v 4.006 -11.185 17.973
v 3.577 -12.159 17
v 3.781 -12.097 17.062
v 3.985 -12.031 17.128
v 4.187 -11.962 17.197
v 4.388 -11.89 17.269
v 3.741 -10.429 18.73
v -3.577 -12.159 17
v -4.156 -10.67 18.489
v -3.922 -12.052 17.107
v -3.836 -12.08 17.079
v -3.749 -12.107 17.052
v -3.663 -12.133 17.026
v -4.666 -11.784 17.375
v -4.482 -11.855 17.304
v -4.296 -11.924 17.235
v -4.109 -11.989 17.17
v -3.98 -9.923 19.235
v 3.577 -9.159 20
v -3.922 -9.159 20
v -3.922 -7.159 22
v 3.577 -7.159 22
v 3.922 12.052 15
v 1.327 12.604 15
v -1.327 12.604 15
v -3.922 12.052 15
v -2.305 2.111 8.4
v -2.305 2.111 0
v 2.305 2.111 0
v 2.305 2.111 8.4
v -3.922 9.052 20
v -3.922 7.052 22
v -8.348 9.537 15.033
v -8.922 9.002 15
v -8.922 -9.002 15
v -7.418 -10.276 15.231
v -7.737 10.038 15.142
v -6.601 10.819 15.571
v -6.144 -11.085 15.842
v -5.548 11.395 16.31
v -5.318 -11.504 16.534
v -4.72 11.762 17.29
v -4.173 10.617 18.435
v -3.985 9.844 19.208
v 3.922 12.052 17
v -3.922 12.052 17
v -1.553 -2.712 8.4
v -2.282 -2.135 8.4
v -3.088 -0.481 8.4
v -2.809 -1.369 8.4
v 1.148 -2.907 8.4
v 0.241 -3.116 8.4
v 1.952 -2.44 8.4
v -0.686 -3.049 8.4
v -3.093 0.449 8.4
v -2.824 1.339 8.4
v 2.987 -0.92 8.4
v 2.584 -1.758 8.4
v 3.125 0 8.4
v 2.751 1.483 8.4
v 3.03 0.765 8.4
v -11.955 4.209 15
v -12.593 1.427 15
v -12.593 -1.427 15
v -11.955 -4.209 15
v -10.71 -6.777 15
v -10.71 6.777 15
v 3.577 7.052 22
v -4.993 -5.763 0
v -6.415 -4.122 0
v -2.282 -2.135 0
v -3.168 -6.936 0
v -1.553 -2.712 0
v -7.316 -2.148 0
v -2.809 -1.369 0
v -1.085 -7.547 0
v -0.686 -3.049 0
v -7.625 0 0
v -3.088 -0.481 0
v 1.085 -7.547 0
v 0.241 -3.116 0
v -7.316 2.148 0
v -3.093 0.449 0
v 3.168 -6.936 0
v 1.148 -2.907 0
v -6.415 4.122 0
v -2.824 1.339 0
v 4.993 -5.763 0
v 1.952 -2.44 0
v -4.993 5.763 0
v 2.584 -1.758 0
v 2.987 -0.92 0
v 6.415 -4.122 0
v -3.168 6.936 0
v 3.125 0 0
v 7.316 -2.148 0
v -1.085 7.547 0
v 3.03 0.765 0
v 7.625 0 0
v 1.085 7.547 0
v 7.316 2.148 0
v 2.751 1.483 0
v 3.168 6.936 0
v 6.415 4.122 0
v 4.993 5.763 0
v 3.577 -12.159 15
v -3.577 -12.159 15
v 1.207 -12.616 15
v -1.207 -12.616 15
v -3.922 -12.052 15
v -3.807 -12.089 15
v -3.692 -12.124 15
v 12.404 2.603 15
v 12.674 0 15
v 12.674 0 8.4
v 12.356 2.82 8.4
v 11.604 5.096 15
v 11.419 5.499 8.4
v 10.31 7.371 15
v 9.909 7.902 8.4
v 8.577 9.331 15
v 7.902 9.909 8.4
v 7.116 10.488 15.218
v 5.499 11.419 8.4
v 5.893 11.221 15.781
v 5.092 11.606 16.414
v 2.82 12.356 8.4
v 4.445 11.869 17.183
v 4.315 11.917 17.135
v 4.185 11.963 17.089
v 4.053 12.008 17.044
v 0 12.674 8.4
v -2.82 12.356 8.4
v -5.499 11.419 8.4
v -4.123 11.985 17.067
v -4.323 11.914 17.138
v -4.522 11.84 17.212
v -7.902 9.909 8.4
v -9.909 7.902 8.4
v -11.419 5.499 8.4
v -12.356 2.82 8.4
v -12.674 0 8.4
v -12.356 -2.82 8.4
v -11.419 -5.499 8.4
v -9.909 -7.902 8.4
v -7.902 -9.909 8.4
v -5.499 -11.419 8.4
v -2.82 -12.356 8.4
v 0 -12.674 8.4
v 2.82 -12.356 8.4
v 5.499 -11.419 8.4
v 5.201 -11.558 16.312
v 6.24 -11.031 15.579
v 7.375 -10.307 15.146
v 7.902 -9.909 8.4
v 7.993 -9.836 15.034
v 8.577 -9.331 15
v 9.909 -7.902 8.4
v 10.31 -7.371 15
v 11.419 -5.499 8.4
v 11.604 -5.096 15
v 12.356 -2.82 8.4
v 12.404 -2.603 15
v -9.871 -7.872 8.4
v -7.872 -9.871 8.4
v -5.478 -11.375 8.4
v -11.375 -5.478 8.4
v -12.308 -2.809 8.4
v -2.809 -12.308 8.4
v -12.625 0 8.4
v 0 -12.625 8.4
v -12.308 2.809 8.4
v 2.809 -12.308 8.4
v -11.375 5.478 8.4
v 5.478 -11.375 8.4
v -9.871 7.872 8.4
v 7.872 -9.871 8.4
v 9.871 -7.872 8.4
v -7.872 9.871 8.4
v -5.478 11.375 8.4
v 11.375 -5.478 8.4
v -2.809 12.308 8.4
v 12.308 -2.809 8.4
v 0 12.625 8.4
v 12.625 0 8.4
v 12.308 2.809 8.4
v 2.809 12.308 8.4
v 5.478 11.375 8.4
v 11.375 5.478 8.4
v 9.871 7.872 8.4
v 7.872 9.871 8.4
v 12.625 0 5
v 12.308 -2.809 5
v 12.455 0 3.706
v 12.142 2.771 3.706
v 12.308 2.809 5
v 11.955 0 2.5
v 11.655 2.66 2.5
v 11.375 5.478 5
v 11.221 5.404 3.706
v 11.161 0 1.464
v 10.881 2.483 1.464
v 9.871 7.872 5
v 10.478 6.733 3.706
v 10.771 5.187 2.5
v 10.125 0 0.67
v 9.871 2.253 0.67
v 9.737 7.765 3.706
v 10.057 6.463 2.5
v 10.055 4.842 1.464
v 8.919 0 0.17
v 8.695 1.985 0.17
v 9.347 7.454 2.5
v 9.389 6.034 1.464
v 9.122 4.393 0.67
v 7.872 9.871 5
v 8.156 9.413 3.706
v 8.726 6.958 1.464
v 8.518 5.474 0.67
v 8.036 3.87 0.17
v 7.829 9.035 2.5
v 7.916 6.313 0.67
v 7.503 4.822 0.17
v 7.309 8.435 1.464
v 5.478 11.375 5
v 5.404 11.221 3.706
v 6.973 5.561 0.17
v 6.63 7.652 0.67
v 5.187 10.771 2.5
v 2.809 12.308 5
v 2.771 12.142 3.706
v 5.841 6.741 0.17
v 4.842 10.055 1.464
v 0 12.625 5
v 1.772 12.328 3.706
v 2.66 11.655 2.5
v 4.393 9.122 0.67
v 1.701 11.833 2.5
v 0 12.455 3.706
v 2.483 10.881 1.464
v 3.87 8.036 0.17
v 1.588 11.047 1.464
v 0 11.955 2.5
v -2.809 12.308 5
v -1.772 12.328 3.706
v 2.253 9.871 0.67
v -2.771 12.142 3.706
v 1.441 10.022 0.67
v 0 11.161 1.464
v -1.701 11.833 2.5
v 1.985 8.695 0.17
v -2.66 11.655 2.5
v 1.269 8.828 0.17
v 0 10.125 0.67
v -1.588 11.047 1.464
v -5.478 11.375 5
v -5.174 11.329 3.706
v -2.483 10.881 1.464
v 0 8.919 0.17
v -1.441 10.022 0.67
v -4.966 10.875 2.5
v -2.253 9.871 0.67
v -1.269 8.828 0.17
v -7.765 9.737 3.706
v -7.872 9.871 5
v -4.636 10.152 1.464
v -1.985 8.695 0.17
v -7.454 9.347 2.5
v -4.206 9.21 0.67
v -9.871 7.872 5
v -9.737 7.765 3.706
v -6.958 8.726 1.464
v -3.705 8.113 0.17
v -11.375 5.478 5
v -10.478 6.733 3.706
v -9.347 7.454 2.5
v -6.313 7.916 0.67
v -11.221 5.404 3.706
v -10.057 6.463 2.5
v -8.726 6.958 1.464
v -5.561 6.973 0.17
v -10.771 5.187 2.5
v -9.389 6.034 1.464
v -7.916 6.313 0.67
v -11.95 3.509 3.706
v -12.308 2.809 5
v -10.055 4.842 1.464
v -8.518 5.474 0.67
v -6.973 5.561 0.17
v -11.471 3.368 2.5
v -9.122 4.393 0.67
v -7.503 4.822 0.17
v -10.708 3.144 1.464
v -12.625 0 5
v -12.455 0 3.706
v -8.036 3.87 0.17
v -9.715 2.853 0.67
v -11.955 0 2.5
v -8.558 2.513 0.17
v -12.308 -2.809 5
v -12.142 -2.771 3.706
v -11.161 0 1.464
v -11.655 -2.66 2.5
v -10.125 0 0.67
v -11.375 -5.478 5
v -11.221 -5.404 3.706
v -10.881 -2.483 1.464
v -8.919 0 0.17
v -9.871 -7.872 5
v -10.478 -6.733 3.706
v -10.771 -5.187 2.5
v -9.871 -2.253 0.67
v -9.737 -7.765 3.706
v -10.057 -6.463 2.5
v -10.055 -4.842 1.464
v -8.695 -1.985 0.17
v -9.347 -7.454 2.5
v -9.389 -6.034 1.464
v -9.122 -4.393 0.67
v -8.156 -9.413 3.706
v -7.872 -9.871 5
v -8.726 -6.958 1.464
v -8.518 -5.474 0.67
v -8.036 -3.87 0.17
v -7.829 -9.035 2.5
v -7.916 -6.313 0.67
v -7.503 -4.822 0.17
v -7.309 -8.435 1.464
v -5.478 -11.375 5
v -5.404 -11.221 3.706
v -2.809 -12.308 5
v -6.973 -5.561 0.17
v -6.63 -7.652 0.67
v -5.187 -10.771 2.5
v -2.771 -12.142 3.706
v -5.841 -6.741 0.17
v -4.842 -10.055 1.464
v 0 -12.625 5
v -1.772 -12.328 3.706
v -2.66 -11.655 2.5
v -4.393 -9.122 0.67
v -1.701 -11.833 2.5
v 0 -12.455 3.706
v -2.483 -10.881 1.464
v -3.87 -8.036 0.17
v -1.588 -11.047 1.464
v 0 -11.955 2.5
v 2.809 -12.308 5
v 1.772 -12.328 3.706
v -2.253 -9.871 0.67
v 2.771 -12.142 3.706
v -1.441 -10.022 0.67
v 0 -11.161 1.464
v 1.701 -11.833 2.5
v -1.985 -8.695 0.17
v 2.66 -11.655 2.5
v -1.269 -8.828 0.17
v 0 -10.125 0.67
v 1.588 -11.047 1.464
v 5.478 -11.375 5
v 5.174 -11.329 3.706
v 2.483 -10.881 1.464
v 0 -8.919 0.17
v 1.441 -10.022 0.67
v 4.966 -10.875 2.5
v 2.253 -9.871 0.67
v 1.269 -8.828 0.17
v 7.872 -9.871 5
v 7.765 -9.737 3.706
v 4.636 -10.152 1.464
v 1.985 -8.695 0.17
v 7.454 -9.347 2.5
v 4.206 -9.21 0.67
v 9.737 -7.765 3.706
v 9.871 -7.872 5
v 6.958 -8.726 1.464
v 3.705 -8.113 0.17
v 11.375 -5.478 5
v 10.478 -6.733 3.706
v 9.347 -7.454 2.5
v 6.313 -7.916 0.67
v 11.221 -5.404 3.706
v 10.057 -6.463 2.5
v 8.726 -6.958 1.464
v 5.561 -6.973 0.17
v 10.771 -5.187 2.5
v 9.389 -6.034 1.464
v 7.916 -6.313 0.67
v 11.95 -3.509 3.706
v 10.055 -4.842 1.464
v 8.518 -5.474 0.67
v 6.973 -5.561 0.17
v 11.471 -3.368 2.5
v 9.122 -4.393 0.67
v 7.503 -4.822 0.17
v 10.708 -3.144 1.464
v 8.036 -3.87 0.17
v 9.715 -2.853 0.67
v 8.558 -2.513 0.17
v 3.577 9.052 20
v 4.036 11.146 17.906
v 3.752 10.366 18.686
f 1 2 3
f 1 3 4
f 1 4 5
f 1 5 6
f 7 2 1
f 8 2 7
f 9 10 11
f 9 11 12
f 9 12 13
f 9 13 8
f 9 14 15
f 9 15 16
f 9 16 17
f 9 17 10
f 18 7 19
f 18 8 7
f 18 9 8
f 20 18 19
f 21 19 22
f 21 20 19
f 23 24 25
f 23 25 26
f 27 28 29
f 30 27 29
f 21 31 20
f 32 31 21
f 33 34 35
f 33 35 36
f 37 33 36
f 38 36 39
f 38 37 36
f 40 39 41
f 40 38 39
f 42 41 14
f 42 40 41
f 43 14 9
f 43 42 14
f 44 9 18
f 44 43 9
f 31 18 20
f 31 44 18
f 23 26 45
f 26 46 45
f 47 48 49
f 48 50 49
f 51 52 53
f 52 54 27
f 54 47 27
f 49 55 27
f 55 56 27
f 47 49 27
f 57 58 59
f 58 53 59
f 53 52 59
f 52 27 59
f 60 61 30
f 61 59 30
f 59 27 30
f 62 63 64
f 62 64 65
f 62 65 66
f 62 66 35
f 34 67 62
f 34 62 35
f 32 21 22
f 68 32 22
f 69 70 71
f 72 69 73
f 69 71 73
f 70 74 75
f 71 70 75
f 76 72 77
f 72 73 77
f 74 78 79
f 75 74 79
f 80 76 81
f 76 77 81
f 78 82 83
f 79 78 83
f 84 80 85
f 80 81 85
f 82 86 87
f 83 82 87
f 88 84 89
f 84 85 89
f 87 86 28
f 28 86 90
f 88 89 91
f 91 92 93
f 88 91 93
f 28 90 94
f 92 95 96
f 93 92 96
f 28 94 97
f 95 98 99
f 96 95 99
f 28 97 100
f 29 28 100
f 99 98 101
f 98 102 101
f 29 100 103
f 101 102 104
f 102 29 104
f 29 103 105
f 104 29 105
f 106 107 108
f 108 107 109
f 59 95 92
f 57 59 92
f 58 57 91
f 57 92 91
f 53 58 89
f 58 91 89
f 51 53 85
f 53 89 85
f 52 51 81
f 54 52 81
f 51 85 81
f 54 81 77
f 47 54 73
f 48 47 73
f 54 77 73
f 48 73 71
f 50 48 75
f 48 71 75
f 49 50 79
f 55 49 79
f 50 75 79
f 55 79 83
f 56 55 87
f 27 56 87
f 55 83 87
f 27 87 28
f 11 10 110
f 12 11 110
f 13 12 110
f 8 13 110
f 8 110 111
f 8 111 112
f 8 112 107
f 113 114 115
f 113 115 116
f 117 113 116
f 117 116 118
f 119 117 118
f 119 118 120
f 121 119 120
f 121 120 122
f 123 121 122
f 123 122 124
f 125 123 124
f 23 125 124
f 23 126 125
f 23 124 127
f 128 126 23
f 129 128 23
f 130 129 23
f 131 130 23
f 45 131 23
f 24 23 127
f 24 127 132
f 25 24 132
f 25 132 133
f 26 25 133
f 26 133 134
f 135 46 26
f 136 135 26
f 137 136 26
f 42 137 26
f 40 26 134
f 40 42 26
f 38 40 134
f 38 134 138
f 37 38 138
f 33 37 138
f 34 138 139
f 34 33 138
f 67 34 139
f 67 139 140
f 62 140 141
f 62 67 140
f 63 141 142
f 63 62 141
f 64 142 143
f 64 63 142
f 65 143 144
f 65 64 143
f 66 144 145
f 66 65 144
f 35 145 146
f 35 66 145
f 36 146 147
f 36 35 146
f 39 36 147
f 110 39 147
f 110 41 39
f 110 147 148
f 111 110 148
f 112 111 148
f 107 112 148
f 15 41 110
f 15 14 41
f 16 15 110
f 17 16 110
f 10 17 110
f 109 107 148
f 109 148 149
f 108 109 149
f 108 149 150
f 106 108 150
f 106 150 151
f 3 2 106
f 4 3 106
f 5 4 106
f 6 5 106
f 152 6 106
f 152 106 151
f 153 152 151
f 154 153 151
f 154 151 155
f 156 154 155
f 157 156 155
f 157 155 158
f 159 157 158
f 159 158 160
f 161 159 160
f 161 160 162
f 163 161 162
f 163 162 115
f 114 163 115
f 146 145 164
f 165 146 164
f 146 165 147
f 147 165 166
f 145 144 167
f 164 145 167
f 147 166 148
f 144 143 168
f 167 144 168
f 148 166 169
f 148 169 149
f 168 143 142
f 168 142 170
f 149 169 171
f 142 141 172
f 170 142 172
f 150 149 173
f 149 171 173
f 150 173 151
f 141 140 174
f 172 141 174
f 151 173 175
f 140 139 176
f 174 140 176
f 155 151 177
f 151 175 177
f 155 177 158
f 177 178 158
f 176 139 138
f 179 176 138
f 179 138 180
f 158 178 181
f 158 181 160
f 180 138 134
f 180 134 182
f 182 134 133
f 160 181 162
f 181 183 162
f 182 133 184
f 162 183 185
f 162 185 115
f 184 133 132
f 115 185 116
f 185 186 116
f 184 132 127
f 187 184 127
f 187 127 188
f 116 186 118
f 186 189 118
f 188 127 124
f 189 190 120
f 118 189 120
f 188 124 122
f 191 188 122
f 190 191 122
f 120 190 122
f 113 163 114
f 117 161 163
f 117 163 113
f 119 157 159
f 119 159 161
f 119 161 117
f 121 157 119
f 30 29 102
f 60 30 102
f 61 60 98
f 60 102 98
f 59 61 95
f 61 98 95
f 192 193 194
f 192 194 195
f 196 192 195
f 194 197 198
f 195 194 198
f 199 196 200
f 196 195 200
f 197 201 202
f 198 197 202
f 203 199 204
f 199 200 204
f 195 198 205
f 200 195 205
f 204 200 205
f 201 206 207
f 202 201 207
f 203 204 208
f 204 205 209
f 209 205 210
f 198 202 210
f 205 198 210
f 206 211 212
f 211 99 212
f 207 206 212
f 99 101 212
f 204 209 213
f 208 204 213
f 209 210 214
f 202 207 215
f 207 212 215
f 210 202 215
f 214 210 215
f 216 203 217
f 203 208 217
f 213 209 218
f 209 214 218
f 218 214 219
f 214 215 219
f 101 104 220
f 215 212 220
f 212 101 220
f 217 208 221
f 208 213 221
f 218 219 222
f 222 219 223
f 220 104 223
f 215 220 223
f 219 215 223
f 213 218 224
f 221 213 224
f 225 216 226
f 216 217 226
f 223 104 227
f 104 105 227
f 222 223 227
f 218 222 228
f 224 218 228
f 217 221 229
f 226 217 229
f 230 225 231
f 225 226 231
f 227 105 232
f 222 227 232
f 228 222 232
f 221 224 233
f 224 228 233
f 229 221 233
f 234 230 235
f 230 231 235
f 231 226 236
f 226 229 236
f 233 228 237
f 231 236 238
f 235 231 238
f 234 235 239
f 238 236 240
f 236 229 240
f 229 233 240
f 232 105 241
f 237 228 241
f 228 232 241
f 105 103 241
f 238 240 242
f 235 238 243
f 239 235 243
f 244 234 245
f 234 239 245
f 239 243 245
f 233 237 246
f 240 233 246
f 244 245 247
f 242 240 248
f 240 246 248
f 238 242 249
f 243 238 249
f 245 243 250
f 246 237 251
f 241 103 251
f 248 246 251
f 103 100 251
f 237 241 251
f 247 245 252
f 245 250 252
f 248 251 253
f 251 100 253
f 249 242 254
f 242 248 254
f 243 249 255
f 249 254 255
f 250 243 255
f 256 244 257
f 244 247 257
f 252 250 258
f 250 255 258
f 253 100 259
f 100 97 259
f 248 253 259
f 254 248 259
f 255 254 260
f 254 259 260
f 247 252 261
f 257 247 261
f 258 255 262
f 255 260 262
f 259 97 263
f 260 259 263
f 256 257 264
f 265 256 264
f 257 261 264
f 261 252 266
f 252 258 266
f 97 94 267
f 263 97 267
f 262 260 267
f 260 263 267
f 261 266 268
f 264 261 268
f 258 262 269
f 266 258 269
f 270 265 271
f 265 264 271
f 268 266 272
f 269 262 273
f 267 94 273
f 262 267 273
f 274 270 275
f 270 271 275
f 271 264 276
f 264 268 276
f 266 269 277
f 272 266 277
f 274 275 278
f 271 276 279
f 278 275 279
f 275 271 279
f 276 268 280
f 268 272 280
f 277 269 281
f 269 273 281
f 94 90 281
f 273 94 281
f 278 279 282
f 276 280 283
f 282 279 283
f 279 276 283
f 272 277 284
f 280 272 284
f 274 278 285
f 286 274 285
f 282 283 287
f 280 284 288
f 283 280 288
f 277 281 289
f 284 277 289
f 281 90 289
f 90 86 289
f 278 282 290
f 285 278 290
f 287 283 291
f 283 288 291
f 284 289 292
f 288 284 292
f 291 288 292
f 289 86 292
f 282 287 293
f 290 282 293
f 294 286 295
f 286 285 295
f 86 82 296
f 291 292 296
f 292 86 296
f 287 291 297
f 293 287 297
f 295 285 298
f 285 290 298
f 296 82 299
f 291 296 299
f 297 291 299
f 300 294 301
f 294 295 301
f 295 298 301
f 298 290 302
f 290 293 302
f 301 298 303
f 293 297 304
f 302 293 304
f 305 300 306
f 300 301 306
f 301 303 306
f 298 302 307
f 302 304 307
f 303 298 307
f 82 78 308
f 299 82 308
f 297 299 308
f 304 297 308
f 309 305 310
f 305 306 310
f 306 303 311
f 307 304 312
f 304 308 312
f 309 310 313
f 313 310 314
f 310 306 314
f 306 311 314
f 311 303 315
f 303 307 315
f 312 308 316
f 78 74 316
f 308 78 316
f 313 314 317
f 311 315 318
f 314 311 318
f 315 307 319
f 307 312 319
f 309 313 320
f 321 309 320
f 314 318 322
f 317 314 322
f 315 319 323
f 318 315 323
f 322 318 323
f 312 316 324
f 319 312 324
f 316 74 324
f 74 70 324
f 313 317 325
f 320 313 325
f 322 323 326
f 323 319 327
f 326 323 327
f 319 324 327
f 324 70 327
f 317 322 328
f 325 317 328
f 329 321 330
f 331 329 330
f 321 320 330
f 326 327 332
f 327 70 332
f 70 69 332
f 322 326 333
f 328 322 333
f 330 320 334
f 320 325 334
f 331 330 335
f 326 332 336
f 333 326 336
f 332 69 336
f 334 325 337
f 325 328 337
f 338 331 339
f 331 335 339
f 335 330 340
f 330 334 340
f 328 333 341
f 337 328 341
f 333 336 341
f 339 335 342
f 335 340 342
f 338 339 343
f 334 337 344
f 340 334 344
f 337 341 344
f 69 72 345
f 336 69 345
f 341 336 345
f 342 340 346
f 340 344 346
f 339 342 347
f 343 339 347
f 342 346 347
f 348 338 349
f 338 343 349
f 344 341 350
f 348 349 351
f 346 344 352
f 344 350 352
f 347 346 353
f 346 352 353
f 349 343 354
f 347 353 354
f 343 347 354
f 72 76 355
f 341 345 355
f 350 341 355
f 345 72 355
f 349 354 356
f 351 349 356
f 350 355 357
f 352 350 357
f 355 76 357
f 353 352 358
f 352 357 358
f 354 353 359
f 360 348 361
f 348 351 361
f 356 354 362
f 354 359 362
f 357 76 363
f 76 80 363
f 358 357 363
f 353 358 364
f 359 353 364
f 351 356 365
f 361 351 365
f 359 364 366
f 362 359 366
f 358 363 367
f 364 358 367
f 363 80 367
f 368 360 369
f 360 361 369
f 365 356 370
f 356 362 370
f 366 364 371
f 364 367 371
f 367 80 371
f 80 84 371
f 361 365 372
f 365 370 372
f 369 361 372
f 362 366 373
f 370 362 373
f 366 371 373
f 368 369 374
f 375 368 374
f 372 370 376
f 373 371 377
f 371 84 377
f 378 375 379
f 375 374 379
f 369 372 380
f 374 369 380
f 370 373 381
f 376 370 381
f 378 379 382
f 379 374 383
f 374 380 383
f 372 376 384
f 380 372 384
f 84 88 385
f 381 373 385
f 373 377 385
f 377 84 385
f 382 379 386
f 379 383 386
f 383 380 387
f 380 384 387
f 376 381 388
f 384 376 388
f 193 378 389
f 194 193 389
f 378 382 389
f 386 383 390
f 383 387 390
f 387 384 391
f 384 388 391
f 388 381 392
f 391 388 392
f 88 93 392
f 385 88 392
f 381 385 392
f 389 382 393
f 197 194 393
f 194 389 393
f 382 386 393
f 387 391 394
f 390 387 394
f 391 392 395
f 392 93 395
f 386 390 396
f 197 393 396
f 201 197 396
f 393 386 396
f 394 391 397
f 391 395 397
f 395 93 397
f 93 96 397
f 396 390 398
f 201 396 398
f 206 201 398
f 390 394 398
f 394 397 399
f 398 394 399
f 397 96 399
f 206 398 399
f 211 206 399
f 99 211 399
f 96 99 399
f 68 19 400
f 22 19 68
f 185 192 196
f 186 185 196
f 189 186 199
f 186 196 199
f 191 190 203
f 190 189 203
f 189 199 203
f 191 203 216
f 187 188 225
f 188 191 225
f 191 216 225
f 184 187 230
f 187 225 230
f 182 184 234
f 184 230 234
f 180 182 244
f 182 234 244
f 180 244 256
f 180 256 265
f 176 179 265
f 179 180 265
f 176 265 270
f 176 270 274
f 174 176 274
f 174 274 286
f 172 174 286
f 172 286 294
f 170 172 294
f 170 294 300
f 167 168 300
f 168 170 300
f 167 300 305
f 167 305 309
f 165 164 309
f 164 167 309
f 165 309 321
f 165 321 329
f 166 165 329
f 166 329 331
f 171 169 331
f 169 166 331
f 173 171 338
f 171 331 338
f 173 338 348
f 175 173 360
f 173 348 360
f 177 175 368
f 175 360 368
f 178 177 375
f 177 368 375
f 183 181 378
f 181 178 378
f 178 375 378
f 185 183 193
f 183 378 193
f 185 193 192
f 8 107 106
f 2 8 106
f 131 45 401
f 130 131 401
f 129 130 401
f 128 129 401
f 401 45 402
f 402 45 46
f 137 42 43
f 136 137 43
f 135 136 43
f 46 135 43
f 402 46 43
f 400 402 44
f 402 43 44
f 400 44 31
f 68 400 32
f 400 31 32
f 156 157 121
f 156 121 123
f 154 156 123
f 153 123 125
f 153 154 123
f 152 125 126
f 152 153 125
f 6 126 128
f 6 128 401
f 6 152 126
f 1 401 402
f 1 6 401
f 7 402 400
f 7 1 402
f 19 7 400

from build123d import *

# Parameters (mm, degrees)
F0_R         = 12.625
F0_R_2       = 10.375
F0_R_3       = 5
F1_DEPTH     = 15
F2_DEPTH     = 15
F3_R         = 12.6739646699
F4_DEPTH     = 6.6
F6_DEPTH     = 7
F7_T4_DEPTH  = 36.6039255786
F7_S5_R      = 12.6739646699
F7_T6_DEPTH  = 20
F7_T10_DEPTH = 24.210816556
F7_S11_R     = 12.6739646699
F7_T12_DEPTH = 14
F8_T1_DEPTH  = 32.8699146781
F9_T1_DEPTH  = 33.2150521969
F10_R        = 5


# Not quite as in the source:
# - a fillet or chamfer that OpenCascade refuses, or shapes differently, is made with other operations: its cross-section is extruded or revolved along the edge and cut away or added
# - a feature names something its author has since deleted; it is built from what else it names


with BuildPart() as f1:
    # F0 (on Top) → F1 (new body)
    with BuildSketch(Plane.XY):
        Circle(F0_R)
        Circle(F0_R_2, mode=Mode.SUBTRACT)
        Circle(F0_R_2)
        Circle(F0_R_3, mode=Mode.SUBTRACT)
    extrude(amount=F1_DEPTH)

    # F0 (on Top) → F2 (join)
    with BuildSketch(Plane.XY):
        Circle(F0_R_3)
        with BuildLine():
            ThreePointArc((2.304625, 2.1105280404), (2.9126944678, 1.1321819366), (3.125, 0))
            ThreePointArc((3.125, 0), (-1.1321819366, -2.9126944678), (-2.304625, 2.1105280404))
            ThreePointArc((-2.304625, 2.1105280404), (0, 3.125), (2.304625, 2.1105280404))
        make_face(mode=Mode.SUBTRACT)
        with BuildLine():
            Line((-2.304625, 2.1105280404), (2.304625, 2.1105280404))
            ThreePointArc((2.304625, 2.1105280404), (0, 3.125), (-2.304625, 2.1105280404))
        make_face()
    extrude(amount=F2_DEPTH)

    # F3 (on face) → F4 (join)
    with BuildSketch(Plane.XY.offset(15)):
        Circle(F3_R)
    extrude(amount=-F4_DEPTH)

    # F5 (on face) → F6 (join)
    with BuildSketch(Plane.XY.offset(15)):
        with BuildLine():
            Line((3.5765423992, 12.0519627893), (-3.921679918, 12.0519627893))
            Line((-3.921679918, 12.0519627893), (-3.921679918, -12.0519627893))
            ThreePointArc((-3.921679918, -12.0519627893), (-3.7494920856, -12.1066382433), (-3.5765423992, -12.1588537667))
            Line((-3.5765423992, -12.1588537667), (3.5765423992, -12.1588537667))
            Line((3.5765423992, -12.1588537667), (3.5765423992, 12.0519627893))
        make_face()
    extrude(amount=F6_DEPTH)

    # F7: fillet of radius 5 on 2 edges, made by hand


with BuildPart() as f7_tool2:
    # F7_s3 → F7_t4 (new body)
    with BuildSketch(Plane.XZ.offset(-12.0519627893)):
        with BuildLine():
            ThreePointArc((-8.921679918, 15), (-5.3861460121, 16.4644660941), (-3.921679918, 20))
            Line((-3.921679918, 20), (-3.921679918, 15))
            Line((-3.921679918, 15), (-8.921679918, 15))
        make_face()
    extrude(amount=F7_T4_DEPTH)

    # F7_s5 → F7_t6 (intersect, symmetric)
    with BuildSketch(Plane.XY.offset(17.5)):
        Circle(F7_S5_R)
    extrude(amount=F7_T6_DEPTH, both=True, mode=Mode.INTERSECT)


with BuildPart() as f1_1:
    add(f1.part)

    # F7_t1: union F7_tool2
    add(f7_tool2.part)


with BuildPart() as f7_tool8:
    # F7_s9 → F7_t10 (new body)
    with BuildSketch(Plane.XZ.offset(12.1588537667)):
        with BuildLine():
            ThreePointArc((8.5765423992, 15), (5.0410084933, 16.4644660941), (3.5765423992, 20))
            Line((3.5765423992, 20), (3.5765423992, 15))
            Line((3.5765423992, 15), (8.5765423992, 15))
        make_face()
    extrude(amount=-F7_T10_DEPTH)

    # F7_s11 → F7_t12 (intersect, symmetric)
    with BuildSketch(Plane.XY.offset(17.5)):
        Circle(F7_S11_R)
    extrude(amount=F7_T12_DEPTH, both=True, mode=Mode.INTERSECT)


with BuildPart() as f1_2:
    add(f1_1.part)

    # F7_t7: union F7_tool8
    add(f7_tool8.part)

    # F8: chamfer of 5 on 1 edges, made by hand

    # F8_s2 → F8_t1 (cut)
    with BuildSketch(Plane.YZ.offset(-16.434957339)):
        Polygon((-12.1588537667, 17), (-7.1588537667, 22), (-12.1588537667, 22), align=None)
    extrude(amount=F8_T1_DEPTH, mode=Mode.SUBTRACT)

    # F9: chamfer of 5 on 1 edges, made by hand

    # F9_s2 → F9_t1 (cut)
    with BuildSketch(Plane.YZ.offset(-16.7800948578)):
        Polygon((12.0519627893, 17), (7.0519627893, 22), (12.0519627893, 22), align=None)
    extrude(amount=F9_T1_DEPTH, mode=Mode.SUBTRACT)

    # F10
    f10_edges = [f1_2.edges().sort_by_distance(p)[0] for p in [
        (-12.625, 0, 0),
    ]]
    fillet(f10_edges, radius=F10_R)


solid = f1_2.part
